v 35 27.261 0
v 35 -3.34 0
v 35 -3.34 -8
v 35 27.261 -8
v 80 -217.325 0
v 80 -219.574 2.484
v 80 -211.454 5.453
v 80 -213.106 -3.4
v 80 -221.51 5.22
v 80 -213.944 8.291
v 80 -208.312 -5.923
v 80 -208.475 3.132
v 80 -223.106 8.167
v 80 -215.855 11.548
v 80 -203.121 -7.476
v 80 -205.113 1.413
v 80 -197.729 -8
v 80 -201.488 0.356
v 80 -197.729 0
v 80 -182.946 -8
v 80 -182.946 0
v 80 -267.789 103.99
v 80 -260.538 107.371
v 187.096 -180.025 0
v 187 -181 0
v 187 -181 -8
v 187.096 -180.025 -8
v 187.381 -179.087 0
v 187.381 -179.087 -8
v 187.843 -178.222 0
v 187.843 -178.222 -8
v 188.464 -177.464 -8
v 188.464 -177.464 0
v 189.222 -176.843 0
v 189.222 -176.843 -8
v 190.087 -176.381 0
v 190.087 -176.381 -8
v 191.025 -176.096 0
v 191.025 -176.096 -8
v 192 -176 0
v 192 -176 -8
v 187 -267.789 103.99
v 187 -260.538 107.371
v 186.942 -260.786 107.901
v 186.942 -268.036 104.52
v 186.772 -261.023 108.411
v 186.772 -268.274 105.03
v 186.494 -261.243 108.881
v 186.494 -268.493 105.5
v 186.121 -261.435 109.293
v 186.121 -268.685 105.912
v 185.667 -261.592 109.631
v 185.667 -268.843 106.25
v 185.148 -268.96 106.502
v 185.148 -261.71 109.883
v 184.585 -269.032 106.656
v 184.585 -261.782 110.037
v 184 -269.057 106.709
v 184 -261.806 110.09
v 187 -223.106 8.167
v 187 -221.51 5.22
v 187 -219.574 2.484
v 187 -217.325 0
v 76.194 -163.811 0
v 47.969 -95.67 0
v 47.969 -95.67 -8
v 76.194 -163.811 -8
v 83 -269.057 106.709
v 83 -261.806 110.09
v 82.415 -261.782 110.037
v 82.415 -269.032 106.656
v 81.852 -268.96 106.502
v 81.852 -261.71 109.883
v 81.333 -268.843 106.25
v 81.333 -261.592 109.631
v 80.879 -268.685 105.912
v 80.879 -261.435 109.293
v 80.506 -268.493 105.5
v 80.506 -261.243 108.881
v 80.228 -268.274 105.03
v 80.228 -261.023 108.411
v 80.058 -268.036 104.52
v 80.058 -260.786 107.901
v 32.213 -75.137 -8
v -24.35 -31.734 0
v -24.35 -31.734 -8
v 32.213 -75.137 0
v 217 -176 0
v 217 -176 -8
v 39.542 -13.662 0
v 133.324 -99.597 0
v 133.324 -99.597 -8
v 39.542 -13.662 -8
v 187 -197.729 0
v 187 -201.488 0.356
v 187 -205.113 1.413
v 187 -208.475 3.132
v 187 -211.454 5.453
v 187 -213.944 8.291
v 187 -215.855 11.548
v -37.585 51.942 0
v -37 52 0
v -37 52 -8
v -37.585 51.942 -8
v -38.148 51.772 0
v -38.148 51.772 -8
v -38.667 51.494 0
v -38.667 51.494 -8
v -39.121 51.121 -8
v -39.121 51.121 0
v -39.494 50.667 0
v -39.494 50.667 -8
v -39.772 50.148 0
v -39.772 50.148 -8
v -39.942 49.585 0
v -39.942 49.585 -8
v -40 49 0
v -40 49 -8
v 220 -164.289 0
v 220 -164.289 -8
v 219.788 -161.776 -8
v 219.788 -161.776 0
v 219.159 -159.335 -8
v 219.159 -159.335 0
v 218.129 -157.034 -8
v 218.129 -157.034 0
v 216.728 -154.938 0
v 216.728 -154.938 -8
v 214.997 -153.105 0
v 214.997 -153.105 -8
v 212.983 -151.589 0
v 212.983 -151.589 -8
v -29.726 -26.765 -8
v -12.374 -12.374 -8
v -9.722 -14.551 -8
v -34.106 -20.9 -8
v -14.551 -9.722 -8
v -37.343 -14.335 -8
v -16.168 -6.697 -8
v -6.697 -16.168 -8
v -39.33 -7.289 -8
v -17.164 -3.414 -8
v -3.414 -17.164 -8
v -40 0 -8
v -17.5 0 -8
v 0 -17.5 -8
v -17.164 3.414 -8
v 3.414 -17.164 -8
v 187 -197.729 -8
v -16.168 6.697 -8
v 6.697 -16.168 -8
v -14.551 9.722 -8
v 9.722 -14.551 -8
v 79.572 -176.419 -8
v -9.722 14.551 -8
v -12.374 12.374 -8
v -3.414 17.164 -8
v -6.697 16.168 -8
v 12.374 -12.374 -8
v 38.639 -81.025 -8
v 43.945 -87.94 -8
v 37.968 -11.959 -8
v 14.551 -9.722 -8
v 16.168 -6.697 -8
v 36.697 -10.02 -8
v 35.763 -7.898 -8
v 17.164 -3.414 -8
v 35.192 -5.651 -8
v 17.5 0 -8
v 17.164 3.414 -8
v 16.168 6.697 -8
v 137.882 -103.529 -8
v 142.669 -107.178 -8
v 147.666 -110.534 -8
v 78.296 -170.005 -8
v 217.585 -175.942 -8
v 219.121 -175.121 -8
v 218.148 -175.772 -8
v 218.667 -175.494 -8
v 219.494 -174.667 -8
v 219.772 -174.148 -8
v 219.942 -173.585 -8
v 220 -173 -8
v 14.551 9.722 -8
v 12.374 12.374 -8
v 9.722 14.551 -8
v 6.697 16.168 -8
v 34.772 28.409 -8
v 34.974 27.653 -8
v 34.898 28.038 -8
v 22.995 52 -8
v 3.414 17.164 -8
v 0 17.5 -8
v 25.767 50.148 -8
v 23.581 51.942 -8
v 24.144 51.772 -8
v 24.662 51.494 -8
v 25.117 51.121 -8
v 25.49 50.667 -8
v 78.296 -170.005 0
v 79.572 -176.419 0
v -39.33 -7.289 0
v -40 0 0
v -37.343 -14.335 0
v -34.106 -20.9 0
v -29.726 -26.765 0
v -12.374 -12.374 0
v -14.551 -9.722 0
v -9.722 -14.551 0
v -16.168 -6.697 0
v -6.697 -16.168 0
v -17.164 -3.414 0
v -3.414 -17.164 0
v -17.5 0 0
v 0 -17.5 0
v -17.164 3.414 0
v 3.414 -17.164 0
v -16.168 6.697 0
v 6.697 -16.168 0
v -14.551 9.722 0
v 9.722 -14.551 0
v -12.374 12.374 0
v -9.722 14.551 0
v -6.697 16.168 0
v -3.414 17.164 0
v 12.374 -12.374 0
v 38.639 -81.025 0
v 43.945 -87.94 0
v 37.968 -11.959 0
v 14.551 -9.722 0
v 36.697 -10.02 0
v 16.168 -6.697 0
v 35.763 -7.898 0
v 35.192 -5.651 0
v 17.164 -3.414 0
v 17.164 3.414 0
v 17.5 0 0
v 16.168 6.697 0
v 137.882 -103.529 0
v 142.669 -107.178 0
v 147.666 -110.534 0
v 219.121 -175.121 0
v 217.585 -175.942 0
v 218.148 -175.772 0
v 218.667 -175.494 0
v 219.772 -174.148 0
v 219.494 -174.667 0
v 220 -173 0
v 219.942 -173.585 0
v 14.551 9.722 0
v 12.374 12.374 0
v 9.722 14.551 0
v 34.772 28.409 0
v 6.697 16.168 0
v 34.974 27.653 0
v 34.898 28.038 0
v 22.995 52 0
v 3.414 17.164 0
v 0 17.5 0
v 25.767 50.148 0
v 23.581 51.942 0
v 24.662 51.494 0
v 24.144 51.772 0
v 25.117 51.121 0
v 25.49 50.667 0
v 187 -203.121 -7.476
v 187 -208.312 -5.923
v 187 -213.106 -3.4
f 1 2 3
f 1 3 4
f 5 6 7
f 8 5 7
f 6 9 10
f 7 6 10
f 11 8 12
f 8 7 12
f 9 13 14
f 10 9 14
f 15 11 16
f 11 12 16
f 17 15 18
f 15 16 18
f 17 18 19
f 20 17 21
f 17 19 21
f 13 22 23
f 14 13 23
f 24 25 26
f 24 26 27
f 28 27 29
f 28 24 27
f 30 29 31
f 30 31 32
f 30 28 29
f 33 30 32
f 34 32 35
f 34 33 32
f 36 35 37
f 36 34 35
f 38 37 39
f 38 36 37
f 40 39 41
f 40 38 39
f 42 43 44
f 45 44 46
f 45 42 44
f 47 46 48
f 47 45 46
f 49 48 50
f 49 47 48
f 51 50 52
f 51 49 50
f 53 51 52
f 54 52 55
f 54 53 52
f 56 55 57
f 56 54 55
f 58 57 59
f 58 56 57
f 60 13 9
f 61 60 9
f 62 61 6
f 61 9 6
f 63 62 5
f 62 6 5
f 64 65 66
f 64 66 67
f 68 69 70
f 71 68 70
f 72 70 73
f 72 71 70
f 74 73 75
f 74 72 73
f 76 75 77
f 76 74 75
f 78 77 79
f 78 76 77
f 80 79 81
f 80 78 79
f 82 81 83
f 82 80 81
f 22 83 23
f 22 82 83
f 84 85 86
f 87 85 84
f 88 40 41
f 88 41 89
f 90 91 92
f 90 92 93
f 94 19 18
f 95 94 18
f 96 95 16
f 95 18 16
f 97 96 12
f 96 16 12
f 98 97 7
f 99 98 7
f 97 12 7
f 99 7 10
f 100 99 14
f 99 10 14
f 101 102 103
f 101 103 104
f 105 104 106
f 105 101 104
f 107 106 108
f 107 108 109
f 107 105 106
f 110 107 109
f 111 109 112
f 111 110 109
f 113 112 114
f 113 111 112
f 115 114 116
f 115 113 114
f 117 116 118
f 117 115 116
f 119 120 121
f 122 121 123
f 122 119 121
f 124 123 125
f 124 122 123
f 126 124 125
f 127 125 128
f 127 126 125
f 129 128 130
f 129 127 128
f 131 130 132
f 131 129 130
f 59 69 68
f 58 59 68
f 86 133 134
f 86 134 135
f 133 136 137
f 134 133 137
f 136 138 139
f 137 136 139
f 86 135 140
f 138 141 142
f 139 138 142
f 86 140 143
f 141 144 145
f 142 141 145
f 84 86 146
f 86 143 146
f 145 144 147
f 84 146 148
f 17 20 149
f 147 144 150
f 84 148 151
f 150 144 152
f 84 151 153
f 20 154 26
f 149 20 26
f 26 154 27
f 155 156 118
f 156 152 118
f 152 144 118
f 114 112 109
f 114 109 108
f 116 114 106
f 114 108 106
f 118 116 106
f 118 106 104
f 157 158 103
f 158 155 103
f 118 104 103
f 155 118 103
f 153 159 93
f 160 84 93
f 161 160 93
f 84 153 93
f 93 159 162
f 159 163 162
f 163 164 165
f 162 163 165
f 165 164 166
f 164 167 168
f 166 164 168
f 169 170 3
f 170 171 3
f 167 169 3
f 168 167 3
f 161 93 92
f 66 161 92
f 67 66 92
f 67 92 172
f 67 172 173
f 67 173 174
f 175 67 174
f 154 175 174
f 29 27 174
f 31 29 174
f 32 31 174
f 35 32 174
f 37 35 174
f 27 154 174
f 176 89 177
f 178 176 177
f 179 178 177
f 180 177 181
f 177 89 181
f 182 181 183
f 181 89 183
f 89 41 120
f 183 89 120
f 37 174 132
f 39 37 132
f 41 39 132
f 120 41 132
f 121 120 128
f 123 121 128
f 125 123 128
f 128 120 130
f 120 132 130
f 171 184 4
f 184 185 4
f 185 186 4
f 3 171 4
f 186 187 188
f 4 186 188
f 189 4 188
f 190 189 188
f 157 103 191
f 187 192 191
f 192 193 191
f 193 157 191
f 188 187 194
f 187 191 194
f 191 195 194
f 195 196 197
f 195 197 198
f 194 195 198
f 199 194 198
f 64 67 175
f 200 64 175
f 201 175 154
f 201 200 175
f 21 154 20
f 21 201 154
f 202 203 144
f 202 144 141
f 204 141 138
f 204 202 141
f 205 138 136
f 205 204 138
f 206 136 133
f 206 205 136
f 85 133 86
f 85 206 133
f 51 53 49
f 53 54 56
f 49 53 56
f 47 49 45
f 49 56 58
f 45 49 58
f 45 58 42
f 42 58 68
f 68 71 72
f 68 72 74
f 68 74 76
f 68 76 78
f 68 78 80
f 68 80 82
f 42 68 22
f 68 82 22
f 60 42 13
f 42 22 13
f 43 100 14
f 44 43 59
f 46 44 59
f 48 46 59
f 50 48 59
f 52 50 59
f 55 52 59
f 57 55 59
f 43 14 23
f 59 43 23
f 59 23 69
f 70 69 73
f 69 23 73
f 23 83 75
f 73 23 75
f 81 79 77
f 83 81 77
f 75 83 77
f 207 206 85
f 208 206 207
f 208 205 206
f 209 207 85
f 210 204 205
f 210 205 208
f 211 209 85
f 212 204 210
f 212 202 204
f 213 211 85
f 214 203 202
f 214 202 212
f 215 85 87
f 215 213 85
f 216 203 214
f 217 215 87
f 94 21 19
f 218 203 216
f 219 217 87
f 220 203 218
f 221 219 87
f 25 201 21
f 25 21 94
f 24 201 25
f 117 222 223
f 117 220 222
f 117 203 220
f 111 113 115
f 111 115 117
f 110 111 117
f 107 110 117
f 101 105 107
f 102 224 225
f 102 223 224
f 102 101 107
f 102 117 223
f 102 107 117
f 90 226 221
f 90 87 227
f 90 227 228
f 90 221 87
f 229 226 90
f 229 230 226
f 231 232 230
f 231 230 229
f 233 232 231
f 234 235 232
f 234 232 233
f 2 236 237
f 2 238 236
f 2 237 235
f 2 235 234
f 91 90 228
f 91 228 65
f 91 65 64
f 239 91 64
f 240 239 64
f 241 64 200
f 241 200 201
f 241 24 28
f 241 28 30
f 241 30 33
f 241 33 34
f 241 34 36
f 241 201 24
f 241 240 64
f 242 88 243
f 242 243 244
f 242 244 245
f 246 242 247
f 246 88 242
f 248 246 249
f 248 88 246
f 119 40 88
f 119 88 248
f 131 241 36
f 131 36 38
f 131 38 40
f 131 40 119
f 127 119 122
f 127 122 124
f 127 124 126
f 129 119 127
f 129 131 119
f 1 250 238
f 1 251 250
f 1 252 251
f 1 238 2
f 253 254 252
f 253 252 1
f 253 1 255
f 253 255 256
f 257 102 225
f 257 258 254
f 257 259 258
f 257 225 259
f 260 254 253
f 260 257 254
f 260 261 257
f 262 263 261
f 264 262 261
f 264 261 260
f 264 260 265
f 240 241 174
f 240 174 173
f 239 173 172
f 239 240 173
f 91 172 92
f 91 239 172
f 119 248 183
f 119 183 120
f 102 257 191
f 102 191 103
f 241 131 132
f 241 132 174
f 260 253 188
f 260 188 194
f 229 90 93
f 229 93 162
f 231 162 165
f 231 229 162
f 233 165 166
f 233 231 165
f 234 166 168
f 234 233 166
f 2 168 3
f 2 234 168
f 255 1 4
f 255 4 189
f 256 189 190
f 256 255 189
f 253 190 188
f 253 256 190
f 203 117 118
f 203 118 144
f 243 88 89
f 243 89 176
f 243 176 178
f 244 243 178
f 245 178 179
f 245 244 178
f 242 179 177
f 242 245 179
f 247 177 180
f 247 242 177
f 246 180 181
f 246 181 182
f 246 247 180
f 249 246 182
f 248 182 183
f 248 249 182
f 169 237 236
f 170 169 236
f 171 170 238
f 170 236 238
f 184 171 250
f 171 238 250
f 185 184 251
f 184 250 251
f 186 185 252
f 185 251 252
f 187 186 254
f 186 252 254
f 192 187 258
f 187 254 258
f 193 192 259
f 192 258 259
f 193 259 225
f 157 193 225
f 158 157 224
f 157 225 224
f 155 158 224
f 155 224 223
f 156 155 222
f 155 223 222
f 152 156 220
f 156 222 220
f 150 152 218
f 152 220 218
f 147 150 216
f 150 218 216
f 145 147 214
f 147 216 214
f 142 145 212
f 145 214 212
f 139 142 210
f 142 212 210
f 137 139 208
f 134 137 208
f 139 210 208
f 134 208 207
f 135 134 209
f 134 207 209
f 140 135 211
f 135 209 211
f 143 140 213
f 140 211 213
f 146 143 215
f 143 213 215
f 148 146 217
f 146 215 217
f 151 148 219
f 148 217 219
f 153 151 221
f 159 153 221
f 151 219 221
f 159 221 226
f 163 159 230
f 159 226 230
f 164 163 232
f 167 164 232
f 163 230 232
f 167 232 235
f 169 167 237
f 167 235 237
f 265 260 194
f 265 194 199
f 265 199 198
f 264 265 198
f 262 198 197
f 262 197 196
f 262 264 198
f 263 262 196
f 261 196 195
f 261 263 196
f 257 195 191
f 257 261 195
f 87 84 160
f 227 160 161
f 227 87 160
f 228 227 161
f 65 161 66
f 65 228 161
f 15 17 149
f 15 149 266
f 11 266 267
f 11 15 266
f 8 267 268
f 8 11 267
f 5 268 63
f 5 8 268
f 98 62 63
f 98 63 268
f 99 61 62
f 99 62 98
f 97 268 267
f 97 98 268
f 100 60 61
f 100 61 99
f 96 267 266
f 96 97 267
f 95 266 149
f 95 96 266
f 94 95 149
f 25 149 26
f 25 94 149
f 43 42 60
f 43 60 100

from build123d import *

# Parameters (mm, degrees)
SKETCH1_R              = 17.5
BASE_EXTRUDE_DEPTH     = 8
PROCESS_BENDS2_START   = 80
PROCESS_BENDS2_DEPTH   = 107
PROCESS_BENDS2_2_DEPTH = 107
PROCESS_BENDS2_START_2 = -200
PROCESS_BENDS2_3_DEPTH = 34.194961468


with BuildPart() as part:
    # Sketch1 → Base-Extrude (new body)
    with BuildSketch(Plane.XY):
        with BuildLine():
            Line((-24.35045716, -31.734133612), (32.213121298, -75.1368939))
            ThreePointArc((32.213121298, -75.1368939), (41.442716862, -84.366489464), (47.969026473, -95.670389296))
            Line((47.969026473, -95.670389296), (76.193976626, -163.811446751))
            ThreePointArc((76.193976626, -163.811446751), (79.03926402, -173.191102268), (80, -182.945618369))
            Line((80, -182.945618369), (80, -330))
            ThreePointArc((80, -330), (80.878679656, -332.121320344), (83, -333))
            Line((83, -333), (184, -333))
            ThreePointArc((184, -333), (186.121320344, -332.121320344), (187, -330))
            Line((187, -330), (187, -181))
            ThreePointArc((187, -181), (188.464466094, -177.464466094), (192, -176))
            Line((192, -176), (217, -176))
            ThreePointArc((217, -176), (219.121320344, -175.121320344), (220, -173))
            Line((220, -173), (220, -164.288637004))
            ThreePointArc((220, -164.288637004), (218.128933039, -157.033906323), (212.9825177, -151.589053894))
            Line((212.9825177, -151.589053894), (147.666248084, -110.53351106))
            ThreePointArc((147.666248084, -110.53351106), (140.248070405, -105.389440946), (133.324011991, -99.597357342))
            Line((133.324011991, -99.597357342), (39.541737093, -13.661735283))
            ThreePointArc((39.541737093, -13.661735283), (36.185639292, -8.978306226), (35, -3.339852568))
            Line((35, -3.339852568), (35, 27.261127274))
            ThreePointArc((35, 27.261127274), (34.942355841, 27.84639824), (34.771638598, 28.409177571))
            Line((34.771638598, 28.409177571), (25.767102684, 50.148050297))
            ThreePointArc((25.767102684, 50.148050297), (24.662174785, 51.494408837), (22.995464086, 52))
            Line((22.995464086, 52), (-37, 52))
            ThreePointArc((-37, 52), (-39.121320344, 51.121320344), (-40, 49))
            Line((-40, 49), (-40, 0))
            ThreePointArc((-40, 0), (-35.874909661, -17.691547609), (-24.35045716, -31.734133612))
        make_face()
        Circle(SKETCH1_R, mode=Mode.SUBTRACT)
    extrude(amount=-BASE_EXTRUDE_DEPTH)

    # Process-Bends2: read off the stored shape, not the designer's step
    # Process-Bends2 outline → Process-Bends2 (cut)
    with BuildSketch(Plane.YZ.offset(PROCESS_BENDS2_START)):
        with BuildLine():
            ThreePointArc((-197.729039967, -8), (-208.312045211, -5.922962794), (-217.324957909, 0))
            Line((-217.324957909, 0), (-333, 0))
            Line((-333, 0), (-333, -8))
            Line((-333, -8), (-197.729039967, -8))
        make_face()
    extrude(amount=PROCESS_BENDS2_DEPTH, mode=Mode.SUBTRACT)

    # Process-Bends2 2 outline → Process-Bends2 2 (add)
    with BuildSketch(Plane.YZ.offset(PROCESS_BENDS2_START)):
        with BuildLine():
            Line((-215.855195707, 11.547634765), (-261.806073579, 110.089610364))
            Line((-261.806073579, 110.089610364), (-269.056535875, 106.70866427))
            Line((-269.056535875, 106.70866427), (-223.105658004, 8.166688671))
            ThreePointArc((-223.105658004, 8.166688671), (-220.583053817, 3.823039502), (-217.324957909, 0))
            Line((-217.324957909, 0), (-197.729039967, 0))
            ThreePointArc((-197.729039967, 0), (-208.475032134, 3.132171084), (-215.855195707, 11.547634765))
        make_face()
    extrude(amount=PROCESS_BENDS2_2_DEPTH)

    # Process-Bends2 3 outline → Process-Bends2 3 (cut)
    with BuildSketch(Plane(origin=(0, 0, 0), x_dir=(1, 0, 0), z_dir=(0, 0.9063077870366512, 0.42261826174069705)).offset(PROCESS_BENDS2_START_2)):
        with BuildLine():
            Line((80, -210.419098874), (83, -210.419098874))
            ThreePointArc((83, -210.419098874), (80.878679657, -209.540419218), (80, -207.419098874))
            Line((80, -207.419098874), (80, -210.419098874))
        make_face()
        with BuildLine():
            ThreePointArc((187, -207.419098874), (186.121320343, -209.540419218), (184, -210.419098874))
            Line((184, -210.419098874), (187, -210.419098874))
            Line((187, -210.419098874), (187, -207.419098874))
        make_face()
    extrude(amount=PROCESS_BENDS2_3_DEPTH, mode=Mode.SUBTRACT)


solid = part.part
